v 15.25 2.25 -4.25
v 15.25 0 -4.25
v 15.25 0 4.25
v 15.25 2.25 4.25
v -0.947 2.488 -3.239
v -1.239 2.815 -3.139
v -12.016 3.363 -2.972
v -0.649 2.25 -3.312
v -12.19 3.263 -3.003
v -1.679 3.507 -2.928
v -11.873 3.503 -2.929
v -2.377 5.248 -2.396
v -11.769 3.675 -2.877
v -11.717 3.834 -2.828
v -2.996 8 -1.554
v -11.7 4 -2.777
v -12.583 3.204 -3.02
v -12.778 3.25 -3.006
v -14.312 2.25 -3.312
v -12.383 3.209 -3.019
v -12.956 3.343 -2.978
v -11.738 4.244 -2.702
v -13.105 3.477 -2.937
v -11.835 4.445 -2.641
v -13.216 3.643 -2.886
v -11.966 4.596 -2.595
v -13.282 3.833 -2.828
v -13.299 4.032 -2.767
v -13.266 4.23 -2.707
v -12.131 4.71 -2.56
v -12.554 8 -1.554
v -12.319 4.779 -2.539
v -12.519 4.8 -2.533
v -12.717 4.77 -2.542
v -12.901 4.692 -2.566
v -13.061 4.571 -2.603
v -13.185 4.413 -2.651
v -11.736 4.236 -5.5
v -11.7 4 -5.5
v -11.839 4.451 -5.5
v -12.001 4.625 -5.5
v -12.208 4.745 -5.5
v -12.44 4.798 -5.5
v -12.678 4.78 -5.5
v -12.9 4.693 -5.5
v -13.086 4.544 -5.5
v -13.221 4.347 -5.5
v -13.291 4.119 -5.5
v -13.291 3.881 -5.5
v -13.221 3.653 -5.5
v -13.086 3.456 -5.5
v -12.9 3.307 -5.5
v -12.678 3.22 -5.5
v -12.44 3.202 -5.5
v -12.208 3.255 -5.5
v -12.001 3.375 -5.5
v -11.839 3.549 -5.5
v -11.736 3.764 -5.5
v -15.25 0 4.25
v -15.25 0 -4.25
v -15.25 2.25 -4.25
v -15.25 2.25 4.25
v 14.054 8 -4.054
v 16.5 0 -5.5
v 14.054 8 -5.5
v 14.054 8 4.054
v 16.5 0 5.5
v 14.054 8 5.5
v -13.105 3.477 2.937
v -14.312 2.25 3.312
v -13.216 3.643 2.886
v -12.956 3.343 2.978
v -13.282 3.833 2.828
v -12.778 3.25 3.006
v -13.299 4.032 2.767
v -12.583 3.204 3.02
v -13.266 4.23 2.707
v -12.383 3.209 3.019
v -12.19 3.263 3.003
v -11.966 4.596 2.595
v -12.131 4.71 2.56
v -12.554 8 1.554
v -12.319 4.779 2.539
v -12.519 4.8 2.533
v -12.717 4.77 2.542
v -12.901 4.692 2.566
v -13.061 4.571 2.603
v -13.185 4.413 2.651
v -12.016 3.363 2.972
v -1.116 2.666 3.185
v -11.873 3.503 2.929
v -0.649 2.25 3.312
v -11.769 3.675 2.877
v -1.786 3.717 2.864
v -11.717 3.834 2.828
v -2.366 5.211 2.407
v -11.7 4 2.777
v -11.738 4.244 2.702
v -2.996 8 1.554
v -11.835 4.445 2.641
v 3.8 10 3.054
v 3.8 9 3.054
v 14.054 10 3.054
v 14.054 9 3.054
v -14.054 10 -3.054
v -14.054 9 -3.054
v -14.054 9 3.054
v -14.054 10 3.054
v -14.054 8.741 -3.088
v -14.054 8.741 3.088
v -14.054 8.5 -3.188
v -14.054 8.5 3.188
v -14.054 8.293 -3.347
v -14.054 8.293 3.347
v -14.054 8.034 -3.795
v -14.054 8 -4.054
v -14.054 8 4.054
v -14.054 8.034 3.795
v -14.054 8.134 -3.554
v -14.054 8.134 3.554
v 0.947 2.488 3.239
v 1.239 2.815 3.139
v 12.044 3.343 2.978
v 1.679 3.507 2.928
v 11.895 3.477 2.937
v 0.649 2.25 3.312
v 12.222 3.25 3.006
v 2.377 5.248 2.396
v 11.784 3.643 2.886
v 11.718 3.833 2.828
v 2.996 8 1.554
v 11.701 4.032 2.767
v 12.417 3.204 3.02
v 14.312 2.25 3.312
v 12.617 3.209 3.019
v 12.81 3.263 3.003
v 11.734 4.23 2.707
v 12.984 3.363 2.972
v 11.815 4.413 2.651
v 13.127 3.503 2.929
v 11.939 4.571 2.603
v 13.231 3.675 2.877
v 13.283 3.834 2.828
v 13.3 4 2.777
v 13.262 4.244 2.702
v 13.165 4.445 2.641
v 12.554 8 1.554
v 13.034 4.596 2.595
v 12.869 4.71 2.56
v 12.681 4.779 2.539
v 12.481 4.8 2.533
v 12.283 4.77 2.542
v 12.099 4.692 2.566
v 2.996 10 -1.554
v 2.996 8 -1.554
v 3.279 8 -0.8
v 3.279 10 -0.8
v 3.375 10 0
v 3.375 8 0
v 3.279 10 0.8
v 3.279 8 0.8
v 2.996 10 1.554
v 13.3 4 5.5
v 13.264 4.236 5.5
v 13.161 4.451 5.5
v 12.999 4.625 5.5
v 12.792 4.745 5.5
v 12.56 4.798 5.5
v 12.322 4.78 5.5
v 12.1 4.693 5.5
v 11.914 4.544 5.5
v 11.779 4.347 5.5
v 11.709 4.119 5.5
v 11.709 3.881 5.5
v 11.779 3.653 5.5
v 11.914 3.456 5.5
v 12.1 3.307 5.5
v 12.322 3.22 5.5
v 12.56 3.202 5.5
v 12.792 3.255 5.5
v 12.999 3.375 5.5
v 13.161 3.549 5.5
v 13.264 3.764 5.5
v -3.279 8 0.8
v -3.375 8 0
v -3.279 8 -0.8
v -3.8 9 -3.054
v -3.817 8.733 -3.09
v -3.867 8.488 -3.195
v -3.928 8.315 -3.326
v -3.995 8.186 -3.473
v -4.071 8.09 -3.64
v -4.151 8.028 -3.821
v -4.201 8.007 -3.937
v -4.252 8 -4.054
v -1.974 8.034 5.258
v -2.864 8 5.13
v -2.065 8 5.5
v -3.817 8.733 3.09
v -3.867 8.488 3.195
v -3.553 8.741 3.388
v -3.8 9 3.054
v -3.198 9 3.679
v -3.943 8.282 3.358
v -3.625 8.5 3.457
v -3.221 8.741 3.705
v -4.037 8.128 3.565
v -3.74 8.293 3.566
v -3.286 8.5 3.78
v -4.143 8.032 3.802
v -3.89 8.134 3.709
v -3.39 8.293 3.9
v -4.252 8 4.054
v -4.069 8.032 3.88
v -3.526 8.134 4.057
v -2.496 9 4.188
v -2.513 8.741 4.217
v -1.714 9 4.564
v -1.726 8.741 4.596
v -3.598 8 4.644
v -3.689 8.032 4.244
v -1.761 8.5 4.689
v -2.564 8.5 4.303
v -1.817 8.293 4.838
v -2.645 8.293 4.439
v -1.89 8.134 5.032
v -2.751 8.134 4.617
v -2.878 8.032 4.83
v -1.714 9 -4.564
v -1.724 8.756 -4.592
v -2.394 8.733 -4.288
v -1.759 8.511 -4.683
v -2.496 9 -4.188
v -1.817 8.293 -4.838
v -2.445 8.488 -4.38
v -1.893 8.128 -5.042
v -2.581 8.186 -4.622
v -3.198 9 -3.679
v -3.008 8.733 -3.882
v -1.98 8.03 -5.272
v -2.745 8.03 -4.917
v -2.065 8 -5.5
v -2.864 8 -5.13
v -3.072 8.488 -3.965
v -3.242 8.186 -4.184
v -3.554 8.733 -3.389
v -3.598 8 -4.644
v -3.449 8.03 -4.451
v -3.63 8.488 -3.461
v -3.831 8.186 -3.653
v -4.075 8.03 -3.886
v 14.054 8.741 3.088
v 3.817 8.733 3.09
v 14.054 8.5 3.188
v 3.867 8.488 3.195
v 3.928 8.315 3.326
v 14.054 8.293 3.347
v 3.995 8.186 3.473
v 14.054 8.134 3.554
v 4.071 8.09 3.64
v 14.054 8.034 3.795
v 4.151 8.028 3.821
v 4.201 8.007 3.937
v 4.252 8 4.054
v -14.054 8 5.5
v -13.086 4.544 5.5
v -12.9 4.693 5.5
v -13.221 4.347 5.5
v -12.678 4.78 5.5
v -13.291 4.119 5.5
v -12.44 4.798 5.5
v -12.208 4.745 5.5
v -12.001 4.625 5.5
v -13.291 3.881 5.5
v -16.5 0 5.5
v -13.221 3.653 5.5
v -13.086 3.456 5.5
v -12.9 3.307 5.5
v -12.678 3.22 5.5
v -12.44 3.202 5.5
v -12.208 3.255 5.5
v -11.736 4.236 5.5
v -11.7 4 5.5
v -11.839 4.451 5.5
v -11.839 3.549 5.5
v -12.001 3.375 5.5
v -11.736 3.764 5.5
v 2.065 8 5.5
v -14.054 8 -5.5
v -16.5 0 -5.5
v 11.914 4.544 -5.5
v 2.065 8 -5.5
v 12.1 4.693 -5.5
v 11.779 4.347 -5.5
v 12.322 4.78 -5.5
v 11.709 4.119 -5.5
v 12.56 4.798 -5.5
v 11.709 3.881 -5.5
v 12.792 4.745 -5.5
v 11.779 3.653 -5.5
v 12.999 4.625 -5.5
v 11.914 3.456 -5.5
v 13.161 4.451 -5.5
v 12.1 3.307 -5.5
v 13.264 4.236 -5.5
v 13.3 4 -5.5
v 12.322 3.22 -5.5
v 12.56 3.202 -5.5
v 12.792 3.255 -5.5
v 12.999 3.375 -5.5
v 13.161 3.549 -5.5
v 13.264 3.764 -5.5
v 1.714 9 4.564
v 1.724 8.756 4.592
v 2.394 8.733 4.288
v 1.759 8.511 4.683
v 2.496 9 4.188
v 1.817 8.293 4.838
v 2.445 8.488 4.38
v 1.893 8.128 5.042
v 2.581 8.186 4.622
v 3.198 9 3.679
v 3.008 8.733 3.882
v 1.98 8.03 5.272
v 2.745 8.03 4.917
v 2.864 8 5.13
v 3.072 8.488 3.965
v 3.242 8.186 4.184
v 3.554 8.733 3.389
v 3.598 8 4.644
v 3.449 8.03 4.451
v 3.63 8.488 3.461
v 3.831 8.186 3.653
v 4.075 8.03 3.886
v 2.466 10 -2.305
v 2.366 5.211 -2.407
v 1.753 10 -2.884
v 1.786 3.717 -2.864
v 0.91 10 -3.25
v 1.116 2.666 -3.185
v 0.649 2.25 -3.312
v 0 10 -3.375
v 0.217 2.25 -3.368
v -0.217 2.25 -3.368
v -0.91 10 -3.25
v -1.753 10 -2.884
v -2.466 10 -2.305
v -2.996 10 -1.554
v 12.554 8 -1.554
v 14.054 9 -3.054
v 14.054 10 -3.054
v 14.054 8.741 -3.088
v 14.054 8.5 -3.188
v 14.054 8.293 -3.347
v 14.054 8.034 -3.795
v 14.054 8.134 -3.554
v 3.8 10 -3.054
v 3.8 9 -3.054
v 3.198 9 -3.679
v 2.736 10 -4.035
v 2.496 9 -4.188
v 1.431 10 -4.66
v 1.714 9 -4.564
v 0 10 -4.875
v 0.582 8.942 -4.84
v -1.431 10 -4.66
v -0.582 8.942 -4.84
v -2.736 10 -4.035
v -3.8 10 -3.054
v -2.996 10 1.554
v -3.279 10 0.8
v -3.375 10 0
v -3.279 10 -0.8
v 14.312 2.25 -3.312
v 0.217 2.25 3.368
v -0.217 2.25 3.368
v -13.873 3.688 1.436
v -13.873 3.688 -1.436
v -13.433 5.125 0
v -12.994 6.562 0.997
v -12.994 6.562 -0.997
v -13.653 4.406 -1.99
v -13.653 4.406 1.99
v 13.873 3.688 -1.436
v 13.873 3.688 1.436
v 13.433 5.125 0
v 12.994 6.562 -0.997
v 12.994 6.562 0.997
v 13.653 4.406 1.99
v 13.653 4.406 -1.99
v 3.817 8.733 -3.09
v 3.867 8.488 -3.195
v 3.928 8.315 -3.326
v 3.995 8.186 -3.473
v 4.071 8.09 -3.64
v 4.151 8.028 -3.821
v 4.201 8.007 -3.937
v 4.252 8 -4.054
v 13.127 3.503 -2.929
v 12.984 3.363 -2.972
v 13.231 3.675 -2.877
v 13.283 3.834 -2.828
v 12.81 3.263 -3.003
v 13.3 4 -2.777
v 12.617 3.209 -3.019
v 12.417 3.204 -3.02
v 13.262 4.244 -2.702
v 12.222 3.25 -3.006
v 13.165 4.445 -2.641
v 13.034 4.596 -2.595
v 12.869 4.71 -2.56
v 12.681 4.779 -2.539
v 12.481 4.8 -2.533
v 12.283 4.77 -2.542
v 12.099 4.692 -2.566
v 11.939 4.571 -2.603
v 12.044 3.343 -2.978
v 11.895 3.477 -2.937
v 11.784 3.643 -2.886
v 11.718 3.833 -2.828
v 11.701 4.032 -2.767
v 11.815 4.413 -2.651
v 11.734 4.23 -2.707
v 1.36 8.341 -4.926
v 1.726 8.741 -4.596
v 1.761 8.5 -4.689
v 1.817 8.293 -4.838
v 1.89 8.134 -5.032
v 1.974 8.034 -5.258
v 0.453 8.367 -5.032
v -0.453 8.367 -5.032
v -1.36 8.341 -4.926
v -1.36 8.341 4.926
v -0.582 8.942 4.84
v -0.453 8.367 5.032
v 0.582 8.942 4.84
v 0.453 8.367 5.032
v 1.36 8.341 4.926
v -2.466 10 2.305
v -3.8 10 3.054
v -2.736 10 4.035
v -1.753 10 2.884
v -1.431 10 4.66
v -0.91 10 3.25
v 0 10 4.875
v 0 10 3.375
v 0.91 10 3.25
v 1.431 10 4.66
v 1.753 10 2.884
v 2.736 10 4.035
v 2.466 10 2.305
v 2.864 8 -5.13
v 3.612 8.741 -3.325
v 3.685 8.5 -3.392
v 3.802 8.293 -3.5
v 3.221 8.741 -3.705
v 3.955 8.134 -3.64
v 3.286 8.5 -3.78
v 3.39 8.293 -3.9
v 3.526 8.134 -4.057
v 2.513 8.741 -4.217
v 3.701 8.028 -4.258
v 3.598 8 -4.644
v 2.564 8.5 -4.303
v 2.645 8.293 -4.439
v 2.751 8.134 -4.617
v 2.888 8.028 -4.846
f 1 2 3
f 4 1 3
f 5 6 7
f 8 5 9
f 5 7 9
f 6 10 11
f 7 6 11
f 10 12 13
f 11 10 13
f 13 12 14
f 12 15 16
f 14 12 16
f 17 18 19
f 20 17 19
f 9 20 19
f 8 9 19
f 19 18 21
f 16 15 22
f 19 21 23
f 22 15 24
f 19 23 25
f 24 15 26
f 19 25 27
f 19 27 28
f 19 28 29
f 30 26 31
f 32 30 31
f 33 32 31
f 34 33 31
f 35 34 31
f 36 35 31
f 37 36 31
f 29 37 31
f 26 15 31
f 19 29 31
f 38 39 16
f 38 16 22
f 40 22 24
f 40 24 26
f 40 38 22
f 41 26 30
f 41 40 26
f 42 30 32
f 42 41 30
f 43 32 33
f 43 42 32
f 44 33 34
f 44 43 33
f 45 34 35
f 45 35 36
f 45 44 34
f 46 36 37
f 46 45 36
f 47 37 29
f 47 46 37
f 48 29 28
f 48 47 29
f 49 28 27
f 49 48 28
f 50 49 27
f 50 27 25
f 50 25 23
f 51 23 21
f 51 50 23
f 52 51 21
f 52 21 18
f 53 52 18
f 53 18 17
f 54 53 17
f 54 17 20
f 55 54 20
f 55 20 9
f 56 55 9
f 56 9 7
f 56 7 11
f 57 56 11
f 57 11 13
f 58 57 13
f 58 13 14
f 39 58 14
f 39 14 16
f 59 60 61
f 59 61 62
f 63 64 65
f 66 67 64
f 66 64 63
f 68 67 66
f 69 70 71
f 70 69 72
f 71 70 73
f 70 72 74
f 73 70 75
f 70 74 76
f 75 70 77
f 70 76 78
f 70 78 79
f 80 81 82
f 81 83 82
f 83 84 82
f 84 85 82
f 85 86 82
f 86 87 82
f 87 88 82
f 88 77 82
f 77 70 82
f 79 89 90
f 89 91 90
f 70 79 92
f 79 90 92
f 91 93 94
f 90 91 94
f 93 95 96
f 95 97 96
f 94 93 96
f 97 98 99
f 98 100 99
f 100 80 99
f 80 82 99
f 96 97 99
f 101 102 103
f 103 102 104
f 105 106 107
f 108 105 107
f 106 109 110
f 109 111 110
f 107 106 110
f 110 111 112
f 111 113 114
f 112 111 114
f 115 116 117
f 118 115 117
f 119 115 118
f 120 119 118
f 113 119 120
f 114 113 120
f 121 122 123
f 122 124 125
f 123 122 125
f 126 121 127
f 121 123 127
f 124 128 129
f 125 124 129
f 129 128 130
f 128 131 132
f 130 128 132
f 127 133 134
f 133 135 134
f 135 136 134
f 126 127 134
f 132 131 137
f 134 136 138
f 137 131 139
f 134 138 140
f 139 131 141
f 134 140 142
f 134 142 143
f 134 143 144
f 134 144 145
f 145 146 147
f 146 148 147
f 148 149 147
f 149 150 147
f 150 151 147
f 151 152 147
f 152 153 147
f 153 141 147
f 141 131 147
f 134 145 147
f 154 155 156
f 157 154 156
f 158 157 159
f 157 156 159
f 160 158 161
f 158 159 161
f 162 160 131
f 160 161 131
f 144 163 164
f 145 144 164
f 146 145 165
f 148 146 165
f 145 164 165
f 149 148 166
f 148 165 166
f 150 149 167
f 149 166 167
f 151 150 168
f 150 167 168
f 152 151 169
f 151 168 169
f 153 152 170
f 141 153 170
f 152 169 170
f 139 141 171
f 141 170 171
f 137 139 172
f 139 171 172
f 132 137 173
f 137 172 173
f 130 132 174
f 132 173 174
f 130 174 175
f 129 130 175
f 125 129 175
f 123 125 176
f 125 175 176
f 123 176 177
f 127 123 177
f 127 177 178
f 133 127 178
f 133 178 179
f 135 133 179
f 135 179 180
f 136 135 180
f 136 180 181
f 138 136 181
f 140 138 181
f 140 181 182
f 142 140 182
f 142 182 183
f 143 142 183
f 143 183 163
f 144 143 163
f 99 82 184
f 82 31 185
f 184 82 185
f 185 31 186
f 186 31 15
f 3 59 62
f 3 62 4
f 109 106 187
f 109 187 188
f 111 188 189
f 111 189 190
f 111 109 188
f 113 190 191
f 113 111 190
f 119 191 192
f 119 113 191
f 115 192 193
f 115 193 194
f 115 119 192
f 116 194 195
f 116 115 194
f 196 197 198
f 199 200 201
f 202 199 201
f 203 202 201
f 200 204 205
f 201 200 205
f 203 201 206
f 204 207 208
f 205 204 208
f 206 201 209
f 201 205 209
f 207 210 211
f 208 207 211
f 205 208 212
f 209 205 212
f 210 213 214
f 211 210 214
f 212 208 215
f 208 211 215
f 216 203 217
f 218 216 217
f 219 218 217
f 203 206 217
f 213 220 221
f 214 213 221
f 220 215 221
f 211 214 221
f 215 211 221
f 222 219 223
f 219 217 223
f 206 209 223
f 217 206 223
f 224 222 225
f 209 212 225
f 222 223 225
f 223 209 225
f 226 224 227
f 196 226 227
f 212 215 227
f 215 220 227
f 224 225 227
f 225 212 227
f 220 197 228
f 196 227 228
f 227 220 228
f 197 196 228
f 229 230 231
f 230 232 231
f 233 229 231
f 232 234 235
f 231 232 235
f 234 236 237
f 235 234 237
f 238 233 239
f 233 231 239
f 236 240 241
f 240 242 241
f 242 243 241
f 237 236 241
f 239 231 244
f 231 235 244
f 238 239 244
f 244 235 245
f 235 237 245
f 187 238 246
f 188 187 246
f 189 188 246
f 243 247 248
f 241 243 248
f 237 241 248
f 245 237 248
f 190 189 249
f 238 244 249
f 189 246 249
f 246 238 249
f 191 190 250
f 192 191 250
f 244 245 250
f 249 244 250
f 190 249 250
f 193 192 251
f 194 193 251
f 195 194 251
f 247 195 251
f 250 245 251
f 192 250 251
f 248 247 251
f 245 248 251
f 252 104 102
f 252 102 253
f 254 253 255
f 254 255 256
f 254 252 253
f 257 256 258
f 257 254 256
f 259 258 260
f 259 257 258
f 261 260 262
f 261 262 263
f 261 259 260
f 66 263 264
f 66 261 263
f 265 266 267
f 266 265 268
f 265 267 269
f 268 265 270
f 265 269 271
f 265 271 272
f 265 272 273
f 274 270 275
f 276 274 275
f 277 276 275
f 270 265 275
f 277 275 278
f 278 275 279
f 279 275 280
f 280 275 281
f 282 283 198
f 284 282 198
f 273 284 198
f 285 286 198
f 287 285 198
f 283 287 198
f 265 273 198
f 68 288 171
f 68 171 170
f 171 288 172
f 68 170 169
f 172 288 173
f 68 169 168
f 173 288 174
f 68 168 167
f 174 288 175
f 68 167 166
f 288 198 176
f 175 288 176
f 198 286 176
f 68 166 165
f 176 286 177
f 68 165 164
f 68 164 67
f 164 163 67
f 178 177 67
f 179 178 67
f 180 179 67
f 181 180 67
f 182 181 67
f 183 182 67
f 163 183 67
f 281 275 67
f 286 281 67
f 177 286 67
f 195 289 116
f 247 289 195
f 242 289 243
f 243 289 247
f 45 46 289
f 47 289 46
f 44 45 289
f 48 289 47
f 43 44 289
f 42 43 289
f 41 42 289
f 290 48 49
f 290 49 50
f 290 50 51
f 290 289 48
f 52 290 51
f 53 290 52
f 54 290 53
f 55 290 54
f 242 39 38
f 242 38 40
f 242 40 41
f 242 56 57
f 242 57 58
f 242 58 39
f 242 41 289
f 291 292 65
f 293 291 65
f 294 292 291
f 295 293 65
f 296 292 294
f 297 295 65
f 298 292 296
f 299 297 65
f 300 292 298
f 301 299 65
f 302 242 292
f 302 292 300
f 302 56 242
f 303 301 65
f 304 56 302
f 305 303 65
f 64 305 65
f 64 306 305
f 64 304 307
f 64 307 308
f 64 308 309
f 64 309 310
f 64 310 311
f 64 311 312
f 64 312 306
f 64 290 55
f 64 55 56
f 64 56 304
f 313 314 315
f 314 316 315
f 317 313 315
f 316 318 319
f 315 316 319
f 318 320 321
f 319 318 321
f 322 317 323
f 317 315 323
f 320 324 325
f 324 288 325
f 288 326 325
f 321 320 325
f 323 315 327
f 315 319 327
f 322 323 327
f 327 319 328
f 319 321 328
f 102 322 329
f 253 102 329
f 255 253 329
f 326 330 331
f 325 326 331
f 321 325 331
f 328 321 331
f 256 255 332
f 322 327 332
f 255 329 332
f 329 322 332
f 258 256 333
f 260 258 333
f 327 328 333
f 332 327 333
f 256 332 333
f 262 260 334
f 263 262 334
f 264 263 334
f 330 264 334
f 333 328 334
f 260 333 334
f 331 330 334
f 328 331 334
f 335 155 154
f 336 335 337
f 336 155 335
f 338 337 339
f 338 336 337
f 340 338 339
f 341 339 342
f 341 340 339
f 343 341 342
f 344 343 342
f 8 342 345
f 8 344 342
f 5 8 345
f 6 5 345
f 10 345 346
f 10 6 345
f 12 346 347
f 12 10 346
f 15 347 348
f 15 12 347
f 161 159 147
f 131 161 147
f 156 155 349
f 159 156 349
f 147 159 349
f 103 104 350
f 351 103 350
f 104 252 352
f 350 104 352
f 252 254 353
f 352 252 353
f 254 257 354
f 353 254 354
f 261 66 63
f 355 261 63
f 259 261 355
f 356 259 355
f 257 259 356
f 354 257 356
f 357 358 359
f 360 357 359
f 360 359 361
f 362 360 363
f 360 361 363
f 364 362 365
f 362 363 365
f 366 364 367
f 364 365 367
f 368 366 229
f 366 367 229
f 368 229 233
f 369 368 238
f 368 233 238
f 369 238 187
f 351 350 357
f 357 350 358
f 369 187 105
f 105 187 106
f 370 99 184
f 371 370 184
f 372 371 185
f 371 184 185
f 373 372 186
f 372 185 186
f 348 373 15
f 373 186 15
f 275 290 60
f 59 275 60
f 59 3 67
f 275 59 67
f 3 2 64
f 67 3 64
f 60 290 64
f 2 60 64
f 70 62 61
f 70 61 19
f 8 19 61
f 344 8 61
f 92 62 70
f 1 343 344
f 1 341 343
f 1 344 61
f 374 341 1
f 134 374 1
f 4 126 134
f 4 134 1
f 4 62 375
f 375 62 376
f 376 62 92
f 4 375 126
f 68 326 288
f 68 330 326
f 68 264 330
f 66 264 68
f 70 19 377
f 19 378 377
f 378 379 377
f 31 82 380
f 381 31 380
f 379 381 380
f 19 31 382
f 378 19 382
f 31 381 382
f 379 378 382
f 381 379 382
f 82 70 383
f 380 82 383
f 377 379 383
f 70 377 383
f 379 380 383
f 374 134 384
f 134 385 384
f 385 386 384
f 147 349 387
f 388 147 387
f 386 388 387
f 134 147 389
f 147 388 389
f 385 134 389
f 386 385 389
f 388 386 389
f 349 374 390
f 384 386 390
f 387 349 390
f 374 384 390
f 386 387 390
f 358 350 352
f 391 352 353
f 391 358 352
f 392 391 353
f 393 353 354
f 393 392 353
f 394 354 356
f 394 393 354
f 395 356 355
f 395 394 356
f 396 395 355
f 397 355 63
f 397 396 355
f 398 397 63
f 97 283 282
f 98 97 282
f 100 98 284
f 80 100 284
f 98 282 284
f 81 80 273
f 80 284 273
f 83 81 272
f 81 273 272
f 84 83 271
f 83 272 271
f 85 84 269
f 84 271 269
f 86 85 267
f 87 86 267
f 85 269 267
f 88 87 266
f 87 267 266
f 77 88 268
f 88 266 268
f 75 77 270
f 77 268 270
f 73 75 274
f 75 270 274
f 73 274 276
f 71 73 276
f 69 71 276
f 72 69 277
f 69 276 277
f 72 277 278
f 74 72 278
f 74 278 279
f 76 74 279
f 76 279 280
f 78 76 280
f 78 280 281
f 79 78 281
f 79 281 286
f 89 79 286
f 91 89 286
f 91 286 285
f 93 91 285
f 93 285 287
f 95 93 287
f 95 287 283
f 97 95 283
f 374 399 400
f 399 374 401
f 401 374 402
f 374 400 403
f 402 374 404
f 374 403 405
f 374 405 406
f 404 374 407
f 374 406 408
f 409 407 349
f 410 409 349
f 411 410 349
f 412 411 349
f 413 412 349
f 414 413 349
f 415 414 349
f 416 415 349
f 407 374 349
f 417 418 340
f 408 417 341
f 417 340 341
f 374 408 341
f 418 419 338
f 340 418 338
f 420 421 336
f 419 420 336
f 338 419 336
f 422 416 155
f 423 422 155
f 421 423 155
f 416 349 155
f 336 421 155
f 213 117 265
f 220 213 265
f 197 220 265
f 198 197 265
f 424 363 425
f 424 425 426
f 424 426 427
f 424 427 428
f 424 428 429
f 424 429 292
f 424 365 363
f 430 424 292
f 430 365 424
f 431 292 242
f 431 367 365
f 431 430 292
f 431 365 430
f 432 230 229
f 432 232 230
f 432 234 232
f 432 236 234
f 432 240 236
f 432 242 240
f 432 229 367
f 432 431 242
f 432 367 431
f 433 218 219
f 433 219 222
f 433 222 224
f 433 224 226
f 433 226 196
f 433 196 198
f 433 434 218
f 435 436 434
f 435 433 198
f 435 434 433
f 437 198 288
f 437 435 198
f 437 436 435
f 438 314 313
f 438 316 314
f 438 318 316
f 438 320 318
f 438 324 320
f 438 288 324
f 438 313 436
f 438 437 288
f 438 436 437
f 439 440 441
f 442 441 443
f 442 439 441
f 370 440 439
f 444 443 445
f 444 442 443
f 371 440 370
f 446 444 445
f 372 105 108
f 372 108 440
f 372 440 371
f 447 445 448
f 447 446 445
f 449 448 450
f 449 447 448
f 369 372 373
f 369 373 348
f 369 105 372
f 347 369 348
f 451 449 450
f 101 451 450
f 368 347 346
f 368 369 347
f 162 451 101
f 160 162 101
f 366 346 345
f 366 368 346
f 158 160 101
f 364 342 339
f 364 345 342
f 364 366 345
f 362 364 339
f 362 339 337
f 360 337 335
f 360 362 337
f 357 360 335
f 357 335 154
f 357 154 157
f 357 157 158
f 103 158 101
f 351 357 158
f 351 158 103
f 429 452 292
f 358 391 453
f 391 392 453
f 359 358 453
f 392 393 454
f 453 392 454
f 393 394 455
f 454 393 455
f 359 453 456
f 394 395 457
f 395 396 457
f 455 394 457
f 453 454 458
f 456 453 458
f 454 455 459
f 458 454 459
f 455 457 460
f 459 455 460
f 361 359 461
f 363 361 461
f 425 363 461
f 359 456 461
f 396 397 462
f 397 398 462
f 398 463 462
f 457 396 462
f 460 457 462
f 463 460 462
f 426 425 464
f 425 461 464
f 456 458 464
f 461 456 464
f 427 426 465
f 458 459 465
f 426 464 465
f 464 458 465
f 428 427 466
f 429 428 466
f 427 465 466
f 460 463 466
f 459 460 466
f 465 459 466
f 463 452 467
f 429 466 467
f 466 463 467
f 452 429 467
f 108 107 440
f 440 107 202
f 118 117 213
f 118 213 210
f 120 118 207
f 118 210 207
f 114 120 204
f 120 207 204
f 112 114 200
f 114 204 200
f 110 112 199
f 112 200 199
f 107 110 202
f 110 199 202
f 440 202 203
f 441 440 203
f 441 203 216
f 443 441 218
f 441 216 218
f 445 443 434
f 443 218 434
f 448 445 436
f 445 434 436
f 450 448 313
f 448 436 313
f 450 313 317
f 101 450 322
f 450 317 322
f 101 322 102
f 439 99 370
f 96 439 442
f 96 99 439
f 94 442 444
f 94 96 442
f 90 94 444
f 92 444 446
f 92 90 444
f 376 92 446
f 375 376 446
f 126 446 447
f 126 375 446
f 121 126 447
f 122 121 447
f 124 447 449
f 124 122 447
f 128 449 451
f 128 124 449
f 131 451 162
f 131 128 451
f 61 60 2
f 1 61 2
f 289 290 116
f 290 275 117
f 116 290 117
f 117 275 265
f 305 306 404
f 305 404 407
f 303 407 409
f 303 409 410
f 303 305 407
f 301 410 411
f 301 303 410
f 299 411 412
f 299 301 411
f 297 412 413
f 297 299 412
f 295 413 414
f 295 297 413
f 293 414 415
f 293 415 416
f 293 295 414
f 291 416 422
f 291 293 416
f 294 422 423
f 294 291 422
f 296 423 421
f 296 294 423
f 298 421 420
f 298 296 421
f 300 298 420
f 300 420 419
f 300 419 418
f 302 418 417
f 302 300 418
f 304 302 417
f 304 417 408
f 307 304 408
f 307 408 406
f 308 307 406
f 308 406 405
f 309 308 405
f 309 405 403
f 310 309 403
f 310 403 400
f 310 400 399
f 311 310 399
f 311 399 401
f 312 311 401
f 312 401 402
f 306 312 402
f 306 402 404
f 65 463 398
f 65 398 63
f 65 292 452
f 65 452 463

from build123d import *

# Parameters (mm, degrees)
SKETCH1_W           = 33
SKETCH1_H           = 11
SKETCH1_W_2         = 30
SKETCH1_H_2         = 8
BOSS_EXTRUDE1_DEPTH = 8
SKETCH1_6_W         = 30
SKETCH1_6_H         = 8
CUT_EXTRUDE1_DEPTH  = 8
CUT_EXTRUDE1_TAPER  = 17
CUT_EXTRUDE3_REACH  = 23.383
SKETCH3_R           = 0.8
BOSS_EXTRUDE6_DEPTH = 2
CUT_EXTRUDE4_DEPTH  = 23.209232315
CUT_EXTRUDE5_START  = -5.955717
SKETCH5_R           = 3.375
CUT_EXTRUDE5_DEPTH  = 7.955717
SKETCH6_W           = 30.5
SKETCH6_H           = 8.5
CUT_EXTRUDE6_DEPTH  = 2.25
FILLET1_R           = 1


with BuildPart() as part:
    # Sketch1 → Boss-Extrude1 (new body)
    # profile 1 of 2: a face of its own
    with BuildSketch(Plane(origin=(0, 0, 0), x_dir=(1, 0, 0), z_dir=(0, 1, 0))):
        Rectangle(SKETCH1_W, SKETCH1_H)
        Rectangle(SKETCH1_W_2, SKETCH1_H_2, mode=Mode.SUBTRACT)
    # profile 2 of 2: a face of its own
    with BuildSketch(Plane(origin=(0, 0, 0), x_dir=(1, 0, 0), z_dir=(0, 1, 0))):
        Rectangle(SKETCH1_W_2, SKETCH1_H_2)
    extrude(amount=BOSS_EXTRUDE1_DEPTH)

    # Sketch1<6> → Cut-Extrude1 (cut)
    with BuildSketch(Plane(origin=(0, 0, 0), x_dir=(1, 0, 0), z_dir=(0, 1, 0))):
        Rectangle(SKETCH1_6_W, SKETCH1_6_H)
    extrude(amount=CUT_EXTRUDE1_DEPTH, taper=CUT_EXTRUDE1_TAPER, mode=Mode.SUBTRACT)

    # Cut-Extrude3: up to this plane
    cut_extrude3_end = Plane(origin=(0, 0, 4), z_dir=(0, 0.2923717047227373, 0.9563047559630353))
    # Sketch3 → Cut-Extrude3 (cut, up to the surface)
    with BuildSketch(Plane.XY.offset(5.5), mode=Mode.PRIVATE) as cut_extrude3_sk1:
        with Locations((-12.5, 4)):
            Circle(SKETCH3_R)
    cut_extrude3_tool1 = split(extrude(cut_extrude3_sk1.sketch, amount=-CUT_EXTRUDE3_REACH, mode=Mode.PRIVATE), bisect_by=cut_extrude3_end, keep=Keep.BOTH, mode=Mode.PRIVATE)
    # Sketch3 → Cut-Extrude3 (cut, up to the surface)
    with BuildSketch(Plane.XY.offset(5.5), mode=Mode.PRIVATE) as cut_extrude3_sk2:
        with Locations((12.5, 4)):
            Circle(SKETCH3_R)
    cut_extrude3_tool2 = split(extrude(cut_extrude3_sk2.sketch, amount=-CUT_EXTRUDE3_REACH, mode=Mode.PRIVATE), bisect_by=cut_extrude3_end, keep=Keep.BOTH, mode=Mode.PRIVATE)
    cut_extrude3 = cut_extrude3_tool1.solids().sort_by_distance((-12.5, 4, 5.5))[0] + cut_extrude3_tool2.solids().sort_by_distance((12.5, 4, 5.5))[0]
    add(cut_extrude3, mode=Mode.SUBTRACT)

    # Mirror1: Cut-Extrude3 across plane
    add(cut_extrude3.mirror(Plane.XY), mode=Mode.SUBTRACT)

    # Sketch2<6> → Boss-Extrude6 (add)
    with BuildSketch(Plane(origin=(0, 8, 0), x_dir=(1, 0, 0), z_dir=(0, 1, 0))):
        with BuildLine():
            Line((3.799705909, -3.054154548), (14.054154548, -3.054154548))
            Line((14.054154548, -3.054154548), (14.054154548, 3.054154548))
            Line((14.054154548, 3.054154548), (3.799705909, 3.054154548))
            ThreePointArc((3.799705909, 3.054154548), (0, 4.875), (-3.799705909, 3.054154548))
            Line((-3.799705909, 3.054154548), (-14.054154548, 3.054154548))
            Line((-14.054154548, 3.054154548), (-14.054154548, -3.054154548))
            Line((-14.054154548, -3.054154548), (-3.799705909, -3.054154548))
            ThreePointArc((-3.799705909, -3.054154548), (0, -4.875), (3.799705909, -3.054154548))
        make_face()
        with BuildLine():
            ThreePointArc((2.995868595, 1.554154548), (3.375, 0), (2.995868595, -1.554154548))
            Line((2.995868595, -1.554154548), (1.626992206, -1.554154548))
            ThreePointArc((1.626992206, -1.554154548), (0, -2.25), (-1.626992206, -1.554154548))
            Line((-1.626992206, -1.554154548), (-2.995868595, -1.554154548))
            ThreePointArc((-2.995868595, -1.554154548), (-3.375, 0), (-2.995868595, 1.554154548))
            Line((-2.995868595, 1.554154548), (-1.626992206, 1.554154548))
            ThreePointArc((-1.626992206, 1.554154548), (0, 2.25), (1.626992206, 1.554154548))
            Line((1.626992206, 1.554154548), (2.995868595, 1.554154548))
        make_face(mode=Mode.SUBTRACT)
    extrude(amount=BOSS_EXTRUDE6_DEPTH)

    # Sketch4 → Cut-Extrude4 (cut, through all)
    with BuildSketch(Plane.XY.offset(5.5)):
        Polygon((-16.5, 0), (-14.054154548, 8), (-16.5, 8), align=None)
        Polygon((16.5, 0), (14.054154548, 8), (16.5, 8), align=None)
    extrude(amount=-CUT_EXTRUDE4_DEPTH, mode=Mode.SUBTRACT)

    # Sketch5 → Cut-Extrude5 (cut)
    with BuildSketch(Plane(origin=(0, 8, 0), x_dir=(1, 0, 0), z_dir=(0, 1, 0)).offset(CUT_EXTRUDE5_START)):
        with Locations(Location((0, 0, 0), (0, 0, 27.418746095))):
            Circle(SKETCH5_R)
    extrude(amount=CUT_EXTRUDE5_DEPTH, mode=Mode.SUBTRACT)

    # Sketch6 → Cut-Extrude6 (cut)
    with BuildSketch(Plane.XZ):
        Rectangle(SKETCH6_W, SKETCH6_H)
    extrude(amount=-CUT_EXTRUDE6_DEPTH, mode=Mode.SUBTRACT)

    # Fillet1
    fillet1_edges = [part.edges().sort_by_distance(p)[0] for p in [
        (8.926930229, 8, 3.054154548),
        (-8.926930229, 8, -3.054154548),
        (0, 8, -4.875),
        (-8.926930229, 8, 3.054154548),
        (0, 8, 4.875),
        (8.926930229, 8, -3.054154548),
    ]]
    fillet(fillet1_edges, radius=FILLET1_R)


solid = part.part
